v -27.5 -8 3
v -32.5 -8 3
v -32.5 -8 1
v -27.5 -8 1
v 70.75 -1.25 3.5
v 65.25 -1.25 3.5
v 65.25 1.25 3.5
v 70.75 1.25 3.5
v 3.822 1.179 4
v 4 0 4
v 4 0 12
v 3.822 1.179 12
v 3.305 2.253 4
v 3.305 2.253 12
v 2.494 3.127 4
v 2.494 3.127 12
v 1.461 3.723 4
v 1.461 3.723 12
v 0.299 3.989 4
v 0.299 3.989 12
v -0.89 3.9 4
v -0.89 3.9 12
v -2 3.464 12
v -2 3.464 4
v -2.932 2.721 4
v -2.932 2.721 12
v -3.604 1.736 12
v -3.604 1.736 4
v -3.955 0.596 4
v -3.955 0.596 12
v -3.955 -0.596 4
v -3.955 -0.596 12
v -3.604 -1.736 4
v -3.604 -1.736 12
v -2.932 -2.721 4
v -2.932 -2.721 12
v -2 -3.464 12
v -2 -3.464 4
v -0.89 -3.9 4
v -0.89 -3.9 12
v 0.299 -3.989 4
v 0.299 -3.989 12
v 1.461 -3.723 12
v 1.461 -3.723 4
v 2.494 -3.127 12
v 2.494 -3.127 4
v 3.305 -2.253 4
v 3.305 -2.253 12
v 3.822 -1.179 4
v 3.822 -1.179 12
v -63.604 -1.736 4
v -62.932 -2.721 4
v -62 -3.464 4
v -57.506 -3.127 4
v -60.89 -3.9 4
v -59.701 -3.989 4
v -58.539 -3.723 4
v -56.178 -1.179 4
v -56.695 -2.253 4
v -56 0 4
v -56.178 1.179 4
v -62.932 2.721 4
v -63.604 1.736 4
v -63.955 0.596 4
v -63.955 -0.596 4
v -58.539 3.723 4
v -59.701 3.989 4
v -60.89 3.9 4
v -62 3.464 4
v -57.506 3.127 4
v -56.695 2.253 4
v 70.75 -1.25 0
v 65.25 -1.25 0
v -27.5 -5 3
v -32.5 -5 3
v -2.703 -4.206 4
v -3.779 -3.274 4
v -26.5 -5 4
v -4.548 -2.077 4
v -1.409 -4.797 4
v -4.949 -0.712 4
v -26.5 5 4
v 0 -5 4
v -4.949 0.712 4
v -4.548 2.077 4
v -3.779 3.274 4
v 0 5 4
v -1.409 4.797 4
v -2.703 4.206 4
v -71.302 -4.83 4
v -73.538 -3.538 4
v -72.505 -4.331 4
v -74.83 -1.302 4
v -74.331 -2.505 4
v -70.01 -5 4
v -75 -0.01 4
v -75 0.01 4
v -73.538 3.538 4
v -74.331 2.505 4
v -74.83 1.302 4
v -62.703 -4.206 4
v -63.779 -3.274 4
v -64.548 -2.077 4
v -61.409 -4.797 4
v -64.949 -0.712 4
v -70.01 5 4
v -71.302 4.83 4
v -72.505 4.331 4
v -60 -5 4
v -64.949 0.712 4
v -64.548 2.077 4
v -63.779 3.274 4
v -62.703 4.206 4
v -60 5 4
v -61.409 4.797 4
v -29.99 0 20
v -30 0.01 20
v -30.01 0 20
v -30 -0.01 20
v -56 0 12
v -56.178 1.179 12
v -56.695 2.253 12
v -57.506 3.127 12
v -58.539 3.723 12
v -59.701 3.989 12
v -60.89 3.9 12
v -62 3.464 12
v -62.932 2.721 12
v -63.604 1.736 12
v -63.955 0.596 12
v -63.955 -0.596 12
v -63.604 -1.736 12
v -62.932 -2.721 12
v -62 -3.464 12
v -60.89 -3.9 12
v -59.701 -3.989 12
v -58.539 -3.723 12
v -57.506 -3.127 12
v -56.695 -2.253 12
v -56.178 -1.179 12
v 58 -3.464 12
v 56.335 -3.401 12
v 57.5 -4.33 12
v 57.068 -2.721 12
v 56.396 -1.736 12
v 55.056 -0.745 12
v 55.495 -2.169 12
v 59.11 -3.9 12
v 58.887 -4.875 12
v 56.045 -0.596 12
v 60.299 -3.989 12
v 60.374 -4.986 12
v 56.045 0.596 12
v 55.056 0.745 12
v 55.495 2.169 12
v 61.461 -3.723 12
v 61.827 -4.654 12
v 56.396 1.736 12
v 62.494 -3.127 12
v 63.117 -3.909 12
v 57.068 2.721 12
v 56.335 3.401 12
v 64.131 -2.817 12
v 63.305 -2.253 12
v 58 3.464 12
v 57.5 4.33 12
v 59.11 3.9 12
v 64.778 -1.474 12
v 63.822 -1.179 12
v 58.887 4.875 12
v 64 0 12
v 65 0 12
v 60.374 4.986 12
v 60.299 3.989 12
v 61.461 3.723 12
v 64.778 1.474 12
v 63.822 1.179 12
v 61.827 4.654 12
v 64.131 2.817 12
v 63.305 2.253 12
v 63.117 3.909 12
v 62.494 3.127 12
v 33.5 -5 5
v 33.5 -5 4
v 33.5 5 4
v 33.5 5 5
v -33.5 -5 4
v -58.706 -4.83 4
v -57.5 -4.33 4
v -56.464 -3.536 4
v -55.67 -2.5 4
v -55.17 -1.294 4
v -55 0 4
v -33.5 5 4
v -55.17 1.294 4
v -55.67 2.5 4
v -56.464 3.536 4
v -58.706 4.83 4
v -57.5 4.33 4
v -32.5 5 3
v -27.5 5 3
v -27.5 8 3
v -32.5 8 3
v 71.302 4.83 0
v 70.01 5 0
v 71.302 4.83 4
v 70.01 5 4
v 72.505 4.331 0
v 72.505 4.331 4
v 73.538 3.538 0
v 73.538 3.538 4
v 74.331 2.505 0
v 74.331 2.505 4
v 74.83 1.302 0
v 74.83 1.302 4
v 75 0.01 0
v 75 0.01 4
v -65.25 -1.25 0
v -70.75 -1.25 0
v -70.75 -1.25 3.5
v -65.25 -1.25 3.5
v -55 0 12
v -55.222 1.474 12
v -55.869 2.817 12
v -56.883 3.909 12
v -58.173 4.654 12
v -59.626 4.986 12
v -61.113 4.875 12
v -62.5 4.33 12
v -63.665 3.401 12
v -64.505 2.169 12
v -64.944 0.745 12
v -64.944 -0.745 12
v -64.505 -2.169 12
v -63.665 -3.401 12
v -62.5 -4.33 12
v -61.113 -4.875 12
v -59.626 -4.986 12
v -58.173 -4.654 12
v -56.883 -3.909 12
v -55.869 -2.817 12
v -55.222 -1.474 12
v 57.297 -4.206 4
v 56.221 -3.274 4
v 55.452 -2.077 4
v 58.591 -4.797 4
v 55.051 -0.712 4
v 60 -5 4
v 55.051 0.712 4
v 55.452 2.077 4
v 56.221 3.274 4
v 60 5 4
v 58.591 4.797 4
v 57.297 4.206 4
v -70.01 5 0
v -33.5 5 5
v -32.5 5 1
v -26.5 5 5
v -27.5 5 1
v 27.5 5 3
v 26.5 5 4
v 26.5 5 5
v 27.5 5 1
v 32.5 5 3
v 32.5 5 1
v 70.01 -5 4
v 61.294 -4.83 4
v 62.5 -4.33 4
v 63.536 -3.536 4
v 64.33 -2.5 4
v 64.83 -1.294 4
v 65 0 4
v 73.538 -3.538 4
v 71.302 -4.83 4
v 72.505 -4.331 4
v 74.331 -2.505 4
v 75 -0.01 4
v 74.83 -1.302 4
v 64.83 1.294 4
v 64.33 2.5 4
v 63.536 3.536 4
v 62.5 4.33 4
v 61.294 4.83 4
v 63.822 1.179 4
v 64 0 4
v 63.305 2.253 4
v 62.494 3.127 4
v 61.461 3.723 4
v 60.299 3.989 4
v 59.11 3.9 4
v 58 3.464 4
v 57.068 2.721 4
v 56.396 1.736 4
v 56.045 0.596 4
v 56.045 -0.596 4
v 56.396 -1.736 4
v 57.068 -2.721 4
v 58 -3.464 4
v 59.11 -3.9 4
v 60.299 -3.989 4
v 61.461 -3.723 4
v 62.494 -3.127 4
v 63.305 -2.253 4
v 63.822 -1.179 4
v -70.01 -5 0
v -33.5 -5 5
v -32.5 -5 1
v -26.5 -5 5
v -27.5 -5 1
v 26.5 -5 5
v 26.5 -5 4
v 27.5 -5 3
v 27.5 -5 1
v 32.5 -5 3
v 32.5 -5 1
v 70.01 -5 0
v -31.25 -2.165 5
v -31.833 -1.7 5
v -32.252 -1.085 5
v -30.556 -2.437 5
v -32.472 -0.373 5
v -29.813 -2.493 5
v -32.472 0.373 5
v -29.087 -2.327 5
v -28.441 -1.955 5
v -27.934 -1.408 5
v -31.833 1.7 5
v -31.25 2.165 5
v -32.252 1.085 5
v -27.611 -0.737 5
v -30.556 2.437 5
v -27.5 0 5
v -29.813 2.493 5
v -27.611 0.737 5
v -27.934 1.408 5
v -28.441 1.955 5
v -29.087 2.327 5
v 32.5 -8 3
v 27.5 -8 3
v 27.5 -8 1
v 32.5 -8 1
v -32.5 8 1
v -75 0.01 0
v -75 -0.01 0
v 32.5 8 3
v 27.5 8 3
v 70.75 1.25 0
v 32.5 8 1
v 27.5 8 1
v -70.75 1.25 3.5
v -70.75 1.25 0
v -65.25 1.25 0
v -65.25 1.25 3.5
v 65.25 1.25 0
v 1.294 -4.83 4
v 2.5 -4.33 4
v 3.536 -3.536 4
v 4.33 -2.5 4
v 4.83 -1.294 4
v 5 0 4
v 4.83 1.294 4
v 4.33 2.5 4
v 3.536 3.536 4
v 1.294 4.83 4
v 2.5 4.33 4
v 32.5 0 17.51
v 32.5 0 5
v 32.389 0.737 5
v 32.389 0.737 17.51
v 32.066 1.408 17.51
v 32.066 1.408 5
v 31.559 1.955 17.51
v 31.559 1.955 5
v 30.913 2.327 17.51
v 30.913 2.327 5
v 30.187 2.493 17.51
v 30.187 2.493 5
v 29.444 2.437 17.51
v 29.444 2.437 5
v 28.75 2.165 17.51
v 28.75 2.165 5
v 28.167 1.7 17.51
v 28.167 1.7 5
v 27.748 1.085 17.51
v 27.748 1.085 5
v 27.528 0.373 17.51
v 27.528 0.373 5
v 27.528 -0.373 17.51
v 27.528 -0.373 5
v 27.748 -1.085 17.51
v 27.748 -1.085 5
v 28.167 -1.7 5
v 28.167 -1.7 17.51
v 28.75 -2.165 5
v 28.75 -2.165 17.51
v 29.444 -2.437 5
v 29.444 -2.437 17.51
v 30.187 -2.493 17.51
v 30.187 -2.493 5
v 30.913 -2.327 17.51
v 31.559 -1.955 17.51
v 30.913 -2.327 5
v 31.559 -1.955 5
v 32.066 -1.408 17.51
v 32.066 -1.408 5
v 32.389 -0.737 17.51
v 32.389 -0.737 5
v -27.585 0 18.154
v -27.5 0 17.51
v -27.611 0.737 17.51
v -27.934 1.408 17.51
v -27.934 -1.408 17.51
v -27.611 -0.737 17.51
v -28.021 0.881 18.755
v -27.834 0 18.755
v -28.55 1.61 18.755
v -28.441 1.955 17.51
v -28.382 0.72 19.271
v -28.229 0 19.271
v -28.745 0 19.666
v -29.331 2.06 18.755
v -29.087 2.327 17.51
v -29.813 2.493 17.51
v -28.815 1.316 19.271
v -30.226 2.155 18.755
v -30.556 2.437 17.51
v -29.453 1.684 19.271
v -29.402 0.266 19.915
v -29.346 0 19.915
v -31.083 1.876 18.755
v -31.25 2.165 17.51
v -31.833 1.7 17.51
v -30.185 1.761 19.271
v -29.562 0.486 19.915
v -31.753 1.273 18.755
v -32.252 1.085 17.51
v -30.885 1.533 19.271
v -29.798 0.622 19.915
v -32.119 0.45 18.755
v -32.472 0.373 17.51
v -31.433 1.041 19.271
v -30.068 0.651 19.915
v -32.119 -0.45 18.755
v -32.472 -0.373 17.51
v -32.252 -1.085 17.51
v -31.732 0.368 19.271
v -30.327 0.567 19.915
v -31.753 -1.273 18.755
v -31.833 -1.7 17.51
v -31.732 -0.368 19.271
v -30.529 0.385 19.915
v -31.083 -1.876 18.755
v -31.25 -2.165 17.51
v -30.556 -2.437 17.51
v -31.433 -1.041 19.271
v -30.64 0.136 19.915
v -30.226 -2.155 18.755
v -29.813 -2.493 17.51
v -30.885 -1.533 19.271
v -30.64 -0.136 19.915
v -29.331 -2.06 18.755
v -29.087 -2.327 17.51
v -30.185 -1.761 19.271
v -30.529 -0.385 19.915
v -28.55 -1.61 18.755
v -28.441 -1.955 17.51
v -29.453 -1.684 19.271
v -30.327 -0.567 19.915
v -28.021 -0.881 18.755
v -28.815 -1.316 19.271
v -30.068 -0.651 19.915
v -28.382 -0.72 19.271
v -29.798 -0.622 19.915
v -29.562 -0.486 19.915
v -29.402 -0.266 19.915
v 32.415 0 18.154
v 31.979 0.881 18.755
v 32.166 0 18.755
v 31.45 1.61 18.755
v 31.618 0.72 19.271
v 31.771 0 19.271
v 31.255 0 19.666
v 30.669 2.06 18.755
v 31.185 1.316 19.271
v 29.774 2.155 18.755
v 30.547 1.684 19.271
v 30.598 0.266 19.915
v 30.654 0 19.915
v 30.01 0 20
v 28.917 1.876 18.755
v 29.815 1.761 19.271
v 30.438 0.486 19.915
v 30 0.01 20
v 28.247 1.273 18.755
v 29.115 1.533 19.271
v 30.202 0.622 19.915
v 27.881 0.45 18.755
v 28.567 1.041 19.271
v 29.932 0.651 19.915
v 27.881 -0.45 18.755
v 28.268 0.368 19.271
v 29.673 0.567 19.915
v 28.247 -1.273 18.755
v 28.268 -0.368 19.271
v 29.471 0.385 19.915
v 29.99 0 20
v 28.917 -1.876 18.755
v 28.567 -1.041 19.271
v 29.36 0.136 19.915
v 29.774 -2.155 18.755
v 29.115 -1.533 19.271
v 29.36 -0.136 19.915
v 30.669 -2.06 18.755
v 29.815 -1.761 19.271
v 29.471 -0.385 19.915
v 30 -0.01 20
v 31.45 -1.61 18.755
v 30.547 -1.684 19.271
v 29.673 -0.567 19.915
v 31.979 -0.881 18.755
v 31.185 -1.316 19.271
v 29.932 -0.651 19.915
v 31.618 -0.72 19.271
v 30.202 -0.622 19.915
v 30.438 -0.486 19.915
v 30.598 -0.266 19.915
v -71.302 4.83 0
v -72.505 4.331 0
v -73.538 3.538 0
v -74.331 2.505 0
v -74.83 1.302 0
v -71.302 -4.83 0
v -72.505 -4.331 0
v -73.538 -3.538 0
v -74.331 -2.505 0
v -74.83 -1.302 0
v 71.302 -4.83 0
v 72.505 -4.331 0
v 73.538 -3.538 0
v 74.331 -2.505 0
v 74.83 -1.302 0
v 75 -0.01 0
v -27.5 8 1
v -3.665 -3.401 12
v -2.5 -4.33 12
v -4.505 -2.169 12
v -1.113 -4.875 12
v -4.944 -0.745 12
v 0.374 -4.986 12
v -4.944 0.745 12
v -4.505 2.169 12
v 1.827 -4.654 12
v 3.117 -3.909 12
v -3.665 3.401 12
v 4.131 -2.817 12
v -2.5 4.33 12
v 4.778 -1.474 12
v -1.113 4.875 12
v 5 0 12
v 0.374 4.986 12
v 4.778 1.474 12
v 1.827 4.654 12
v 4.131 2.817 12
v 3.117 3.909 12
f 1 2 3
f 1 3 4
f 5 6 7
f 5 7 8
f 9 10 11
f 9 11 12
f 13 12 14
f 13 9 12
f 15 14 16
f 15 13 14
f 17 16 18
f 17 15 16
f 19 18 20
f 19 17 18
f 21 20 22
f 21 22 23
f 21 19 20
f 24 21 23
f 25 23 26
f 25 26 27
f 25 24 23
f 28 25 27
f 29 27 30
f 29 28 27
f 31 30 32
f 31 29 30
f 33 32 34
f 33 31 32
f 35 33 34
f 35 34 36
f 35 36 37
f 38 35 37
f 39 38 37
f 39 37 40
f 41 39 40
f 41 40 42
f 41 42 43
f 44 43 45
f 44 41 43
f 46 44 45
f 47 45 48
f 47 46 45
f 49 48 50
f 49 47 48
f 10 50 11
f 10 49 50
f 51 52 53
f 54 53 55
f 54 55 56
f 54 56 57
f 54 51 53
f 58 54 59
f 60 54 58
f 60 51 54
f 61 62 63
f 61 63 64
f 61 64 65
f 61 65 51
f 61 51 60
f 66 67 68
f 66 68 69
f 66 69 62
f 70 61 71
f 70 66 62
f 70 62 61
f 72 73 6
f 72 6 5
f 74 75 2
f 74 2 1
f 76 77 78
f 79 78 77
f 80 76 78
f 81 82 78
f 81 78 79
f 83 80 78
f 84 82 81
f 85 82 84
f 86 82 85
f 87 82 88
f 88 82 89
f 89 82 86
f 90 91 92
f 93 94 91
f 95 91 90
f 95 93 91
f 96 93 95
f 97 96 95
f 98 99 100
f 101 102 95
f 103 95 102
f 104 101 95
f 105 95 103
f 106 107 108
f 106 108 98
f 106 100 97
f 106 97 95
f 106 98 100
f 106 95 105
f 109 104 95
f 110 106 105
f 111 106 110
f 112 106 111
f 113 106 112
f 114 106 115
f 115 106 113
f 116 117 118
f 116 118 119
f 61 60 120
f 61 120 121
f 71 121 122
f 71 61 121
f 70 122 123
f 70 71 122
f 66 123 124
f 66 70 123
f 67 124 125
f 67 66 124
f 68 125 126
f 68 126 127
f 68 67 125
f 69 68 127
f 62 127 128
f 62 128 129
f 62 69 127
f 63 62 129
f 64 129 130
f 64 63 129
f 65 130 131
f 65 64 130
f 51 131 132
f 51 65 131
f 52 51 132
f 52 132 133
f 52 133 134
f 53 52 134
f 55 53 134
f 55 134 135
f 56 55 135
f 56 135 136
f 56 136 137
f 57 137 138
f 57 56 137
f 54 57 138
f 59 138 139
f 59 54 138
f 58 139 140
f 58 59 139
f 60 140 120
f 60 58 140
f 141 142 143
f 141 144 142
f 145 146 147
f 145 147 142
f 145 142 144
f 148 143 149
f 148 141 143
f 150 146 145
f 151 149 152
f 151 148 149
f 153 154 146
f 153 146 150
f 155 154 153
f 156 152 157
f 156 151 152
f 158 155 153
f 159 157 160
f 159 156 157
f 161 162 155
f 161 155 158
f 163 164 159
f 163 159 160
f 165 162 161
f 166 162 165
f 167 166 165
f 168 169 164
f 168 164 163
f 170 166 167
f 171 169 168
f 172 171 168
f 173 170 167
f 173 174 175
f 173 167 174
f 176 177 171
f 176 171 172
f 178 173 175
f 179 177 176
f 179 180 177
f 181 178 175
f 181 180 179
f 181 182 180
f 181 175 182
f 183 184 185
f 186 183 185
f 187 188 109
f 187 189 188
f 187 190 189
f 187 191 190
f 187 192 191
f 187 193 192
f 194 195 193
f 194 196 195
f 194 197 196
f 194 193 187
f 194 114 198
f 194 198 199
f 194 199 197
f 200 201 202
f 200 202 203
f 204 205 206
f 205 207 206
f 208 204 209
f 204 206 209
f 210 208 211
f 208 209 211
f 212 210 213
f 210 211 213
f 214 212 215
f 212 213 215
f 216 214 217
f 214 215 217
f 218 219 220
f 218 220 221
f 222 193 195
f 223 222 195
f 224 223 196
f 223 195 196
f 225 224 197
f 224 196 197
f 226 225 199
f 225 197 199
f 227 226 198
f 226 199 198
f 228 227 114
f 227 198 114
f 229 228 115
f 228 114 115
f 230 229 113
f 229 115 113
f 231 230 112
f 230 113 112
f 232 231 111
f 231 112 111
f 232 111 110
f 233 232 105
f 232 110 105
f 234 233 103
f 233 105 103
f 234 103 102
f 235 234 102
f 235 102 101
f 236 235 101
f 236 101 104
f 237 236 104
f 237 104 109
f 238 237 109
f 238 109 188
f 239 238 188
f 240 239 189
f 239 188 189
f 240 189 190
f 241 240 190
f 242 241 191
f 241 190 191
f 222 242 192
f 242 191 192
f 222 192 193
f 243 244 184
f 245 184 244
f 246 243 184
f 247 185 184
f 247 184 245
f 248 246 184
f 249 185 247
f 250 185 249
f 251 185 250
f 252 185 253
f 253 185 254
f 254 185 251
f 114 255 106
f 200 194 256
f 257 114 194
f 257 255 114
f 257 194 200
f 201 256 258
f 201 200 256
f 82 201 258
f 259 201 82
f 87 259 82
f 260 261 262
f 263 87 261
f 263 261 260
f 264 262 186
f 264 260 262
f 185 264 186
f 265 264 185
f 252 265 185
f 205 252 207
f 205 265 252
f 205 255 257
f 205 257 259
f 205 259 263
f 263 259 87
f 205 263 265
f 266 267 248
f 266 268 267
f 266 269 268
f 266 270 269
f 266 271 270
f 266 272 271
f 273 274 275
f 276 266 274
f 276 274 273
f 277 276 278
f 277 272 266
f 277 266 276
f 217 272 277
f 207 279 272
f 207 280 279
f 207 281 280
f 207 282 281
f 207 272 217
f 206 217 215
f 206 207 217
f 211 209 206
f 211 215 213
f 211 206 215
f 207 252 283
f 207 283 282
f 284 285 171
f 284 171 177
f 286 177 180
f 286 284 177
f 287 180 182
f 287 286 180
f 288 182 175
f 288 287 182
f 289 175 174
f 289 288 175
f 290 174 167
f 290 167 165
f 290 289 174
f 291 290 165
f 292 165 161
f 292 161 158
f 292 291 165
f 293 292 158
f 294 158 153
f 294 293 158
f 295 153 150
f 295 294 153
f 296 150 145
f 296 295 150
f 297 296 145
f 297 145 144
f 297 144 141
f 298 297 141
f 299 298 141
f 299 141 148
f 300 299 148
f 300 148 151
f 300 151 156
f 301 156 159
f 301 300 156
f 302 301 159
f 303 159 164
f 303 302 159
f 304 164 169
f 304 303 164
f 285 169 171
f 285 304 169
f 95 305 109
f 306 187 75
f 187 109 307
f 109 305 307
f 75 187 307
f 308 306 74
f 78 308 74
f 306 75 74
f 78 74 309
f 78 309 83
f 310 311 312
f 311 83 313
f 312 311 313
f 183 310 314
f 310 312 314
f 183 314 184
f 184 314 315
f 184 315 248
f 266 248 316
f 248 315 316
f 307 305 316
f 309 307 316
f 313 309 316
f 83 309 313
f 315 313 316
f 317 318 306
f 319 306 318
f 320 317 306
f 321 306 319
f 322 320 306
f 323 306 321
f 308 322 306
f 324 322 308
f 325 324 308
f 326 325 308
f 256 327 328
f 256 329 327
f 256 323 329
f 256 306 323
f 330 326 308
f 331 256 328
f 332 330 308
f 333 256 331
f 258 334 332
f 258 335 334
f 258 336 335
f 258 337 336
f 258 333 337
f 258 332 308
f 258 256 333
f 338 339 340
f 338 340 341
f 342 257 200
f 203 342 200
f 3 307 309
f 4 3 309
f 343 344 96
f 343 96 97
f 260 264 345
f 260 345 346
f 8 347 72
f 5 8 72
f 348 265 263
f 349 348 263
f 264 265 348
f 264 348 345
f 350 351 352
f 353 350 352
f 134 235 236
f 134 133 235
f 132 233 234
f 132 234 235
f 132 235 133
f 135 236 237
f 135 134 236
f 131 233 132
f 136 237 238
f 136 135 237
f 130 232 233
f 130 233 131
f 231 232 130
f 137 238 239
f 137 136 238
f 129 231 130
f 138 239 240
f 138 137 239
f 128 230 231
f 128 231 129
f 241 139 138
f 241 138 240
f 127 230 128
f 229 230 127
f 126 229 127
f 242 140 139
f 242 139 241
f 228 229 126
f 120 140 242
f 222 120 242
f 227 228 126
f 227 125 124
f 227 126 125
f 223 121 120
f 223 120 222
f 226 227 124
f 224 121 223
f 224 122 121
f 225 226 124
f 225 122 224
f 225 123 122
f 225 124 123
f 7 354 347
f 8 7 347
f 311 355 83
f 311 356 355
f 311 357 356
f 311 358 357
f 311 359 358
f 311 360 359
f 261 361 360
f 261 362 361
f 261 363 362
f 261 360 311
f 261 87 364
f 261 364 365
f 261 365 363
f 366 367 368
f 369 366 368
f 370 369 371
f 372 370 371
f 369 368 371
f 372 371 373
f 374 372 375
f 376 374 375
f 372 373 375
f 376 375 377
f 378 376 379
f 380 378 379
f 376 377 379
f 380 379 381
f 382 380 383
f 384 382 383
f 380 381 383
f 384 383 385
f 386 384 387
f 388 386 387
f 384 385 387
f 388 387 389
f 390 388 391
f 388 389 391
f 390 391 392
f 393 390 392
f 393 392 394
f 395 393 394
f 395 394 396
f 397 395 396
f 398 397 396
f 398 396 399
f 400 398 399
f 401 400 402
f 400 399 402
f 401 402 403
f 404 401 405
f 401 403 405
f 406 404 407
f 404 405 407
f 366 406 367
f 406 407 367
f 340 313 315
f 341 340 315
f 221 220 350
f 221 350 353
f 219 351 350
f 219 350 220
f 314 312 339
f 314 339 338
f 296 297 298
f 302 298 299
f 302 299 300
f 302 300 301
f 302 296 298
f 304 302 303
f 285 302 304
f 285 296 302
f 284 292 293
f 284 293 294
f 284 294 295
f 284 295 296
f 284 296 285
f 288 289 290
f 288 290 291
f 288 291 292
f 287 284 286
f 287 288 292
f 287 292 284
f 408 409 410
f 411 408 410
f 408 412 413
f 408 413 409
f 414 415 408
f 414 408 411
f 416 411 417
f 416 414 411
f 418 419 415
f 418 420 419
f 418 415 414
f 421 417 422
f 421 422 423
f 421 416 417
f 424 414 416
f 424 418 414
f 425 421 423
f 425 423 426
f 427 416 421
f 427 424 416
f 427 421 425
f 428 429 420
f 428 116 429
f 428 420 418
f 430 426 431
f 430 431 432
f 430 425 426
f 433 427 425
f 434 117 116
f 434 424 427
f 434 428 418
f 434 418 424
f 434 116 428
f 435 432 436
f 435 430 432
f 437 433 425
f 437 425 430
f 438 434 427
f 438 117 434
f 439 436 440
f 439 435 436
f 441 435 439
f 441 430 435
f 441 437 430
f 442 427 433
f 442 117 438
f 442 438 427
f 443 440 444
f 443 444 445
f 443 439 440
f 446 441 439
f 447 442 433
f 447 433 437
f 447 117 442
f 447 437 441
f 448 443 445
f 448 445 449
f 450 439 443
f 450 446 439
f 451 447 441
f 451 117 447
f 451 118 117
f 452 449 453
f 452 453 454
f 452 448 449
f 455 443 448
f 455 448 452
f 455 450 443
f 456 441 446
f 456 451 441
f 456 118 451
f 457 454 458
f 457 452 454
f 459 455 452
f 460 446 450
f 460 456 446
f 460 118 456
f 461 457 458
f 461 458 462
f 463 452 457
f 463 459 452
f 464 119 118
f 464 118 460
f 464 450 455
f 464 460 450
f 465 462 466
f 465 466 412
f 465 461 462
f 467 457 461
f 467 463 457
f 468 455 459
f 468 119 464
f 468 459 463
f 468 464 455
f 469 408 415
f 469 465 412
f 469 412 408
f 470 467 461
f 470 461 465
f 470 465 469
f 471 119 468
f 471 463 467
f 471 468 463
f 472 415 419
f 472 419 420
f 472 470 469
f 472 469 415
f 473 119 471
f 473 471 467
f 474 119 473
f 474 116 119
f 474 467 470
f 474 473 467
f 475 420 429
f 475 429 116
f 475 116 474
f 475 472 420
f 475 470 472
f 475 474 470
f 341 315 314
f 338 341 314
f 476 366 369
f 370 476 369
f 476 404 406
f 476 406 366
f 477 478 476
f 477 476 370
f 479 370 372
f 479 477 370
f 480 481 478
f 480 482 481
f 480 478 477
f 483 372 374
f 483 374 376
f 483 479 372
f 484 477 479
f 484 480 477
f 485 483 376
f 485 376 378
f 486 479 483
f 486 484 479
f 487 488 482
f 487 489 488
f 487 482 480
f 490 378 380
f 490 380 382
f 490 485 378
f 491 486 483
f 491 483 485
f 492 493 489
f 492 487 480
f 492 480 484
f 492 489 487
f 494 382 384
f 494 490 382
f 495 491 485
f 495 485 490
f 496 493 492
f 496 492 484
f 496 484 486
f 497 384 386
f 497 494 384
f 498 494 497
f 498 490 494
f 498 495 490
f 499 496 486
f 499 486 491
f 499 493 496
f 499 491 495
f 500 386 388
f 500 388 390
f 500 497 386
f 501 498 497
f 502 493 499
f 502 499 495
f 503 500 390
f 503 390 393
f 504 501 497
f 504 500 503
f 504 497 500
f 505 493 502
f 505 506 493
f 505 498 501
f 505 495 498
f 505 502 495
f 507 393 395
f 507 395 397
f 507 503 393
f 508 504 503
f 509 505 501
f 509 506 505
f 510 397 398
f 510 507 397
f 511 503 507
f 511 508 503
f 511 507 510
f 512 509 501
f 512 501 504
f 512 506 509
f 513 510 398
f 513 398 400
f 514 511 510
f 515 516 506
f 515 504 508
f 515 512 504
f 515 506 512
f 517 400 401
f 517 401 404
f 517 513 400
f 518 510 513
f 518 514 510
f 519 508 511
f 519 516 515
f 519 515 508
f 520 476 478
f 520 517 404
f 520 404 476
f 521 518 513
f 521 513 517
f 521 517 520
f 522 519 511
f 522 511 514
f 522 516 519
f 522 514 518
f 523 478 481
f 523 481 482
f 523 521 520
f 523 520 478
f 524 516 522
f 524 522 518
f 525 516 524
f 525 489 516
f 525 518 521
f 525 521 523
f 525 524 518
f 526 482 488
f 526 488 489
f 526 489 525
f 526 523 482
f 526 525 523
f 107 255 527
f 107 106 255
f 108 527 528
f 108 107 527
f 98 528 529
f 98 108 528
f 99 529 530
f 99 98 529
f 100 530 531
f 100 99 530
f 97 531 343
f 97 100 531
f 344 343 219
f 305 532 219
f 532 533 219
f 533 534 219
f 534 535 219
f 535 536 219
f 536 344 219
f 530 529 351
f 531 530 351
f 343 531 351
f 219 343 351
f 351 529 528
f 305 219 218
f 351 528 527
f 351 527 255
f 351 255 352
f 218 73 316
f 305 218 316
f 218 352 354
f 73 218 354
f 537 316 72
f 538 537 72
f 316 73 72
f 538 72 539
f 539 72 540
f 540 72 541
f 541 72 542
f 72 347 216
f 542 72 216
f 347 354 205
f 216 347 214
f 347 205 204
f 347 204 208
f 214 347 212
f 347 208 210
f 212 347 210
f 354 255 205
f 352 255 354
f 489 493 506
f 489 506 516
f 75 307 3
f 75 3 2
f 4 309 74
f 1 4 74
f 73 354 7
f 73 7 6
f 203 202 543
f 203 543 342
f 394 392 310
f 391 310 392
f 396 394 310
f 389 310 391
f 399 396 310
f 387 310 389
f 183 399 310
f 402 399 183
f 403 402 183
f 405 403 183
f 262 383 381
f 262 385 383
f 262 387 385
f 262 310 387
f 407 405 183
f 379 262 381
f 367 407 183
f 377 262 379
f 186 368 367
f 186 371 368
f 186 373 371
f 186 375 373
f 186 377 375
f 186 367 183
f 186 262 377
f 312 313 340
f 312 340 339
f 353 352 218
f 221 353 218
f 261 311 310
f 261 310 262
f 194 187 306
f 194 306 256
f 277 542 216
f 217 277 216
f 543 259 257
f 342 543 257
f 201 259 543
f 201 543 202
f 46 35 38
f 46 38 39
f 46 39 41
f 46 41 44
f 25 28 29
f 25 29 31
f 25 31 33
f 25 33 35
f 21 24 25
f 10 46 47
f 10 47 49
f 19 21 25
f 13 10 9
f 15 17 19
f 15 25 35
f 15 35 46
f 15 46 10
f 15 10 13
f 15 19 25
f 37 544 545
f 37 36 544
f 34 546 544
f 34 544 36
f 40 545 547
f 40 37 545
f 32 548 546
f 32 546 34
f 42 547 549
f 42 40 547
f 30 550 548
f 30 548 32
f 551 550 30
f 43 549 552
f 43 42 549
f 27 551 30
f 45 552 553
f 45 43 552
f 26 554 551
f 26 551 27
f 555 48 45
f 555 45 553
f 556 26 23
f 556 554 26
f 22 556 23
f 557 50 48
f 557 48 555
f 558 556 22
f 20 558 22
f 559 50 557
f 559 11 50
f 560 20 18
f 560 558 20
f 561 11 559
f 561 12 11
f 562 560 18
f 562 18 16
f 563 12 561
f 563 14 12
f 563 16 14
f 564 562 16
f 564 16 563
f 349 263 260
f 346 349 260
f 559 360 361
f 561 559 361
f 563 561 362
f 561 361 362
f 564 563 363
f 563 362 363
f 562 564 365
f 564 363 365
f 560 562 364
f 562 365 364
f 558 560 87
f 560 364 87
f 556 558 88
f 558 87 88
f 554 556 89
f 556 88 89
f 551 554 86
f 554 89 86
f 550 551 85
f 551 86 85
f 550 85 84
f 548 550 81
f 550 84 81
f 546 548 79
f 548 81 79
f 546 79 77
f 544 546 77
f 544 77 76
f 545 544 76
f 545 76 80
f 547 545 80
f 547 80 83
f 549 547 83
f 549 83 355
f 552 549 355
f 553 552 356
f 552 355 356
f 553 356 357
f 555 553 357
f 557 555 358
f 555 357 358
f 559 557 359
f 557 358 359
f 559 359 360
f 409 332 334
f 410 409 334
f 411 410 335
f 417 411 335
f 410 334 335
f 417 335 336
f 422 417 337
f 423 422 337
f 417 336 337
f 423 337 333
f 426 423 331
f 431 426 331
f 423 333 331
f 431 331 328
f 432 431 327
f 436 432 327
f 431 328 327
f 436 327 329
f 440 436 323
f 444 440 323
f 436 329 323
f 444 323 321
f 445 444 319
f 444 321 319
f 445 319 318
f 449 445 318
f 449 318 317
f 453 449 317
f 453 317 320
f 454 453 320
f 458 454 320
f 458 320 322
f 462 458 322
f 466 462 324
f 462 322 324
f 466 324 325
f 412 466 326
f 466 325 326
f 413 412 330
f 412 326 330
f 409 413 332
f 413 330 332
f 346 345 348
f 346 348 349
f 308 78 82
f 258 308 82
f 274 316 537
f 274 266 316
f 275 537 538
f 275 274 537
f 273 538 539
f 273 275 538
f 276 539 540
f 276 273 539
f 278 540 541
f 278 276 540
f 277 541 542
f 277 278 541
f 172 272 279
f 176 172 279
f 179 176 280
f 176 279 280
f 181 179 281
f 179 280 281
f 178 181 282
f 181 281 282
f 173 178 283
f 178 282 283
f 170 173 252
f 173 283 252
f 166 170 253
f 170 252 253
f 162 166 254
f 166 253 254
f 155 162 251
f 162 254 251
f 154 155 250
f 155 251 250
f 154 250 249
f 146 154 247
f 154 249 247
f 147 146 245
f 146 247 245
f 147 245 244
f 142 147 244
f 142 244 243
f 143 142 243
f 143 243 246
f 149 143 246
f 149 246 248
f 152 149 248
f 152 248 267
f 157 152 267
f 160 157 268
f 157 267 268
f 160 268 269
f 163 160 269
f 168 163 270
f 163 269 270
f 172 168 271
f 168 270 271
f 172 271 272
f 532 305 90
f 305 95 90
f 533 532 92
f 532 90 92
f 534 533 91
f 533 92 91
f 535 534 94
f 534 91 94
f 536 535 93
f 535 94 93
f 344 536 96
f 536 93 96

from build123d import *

# Parameters (mm, degrees)
SKETCH_W      = 150
SKETCH_H      = 10
PAD_DEPTH     = 4
SKETCH001_R   = 5
SKETCH001_R_2 = 4
PAD001_DEPTH  = 8
FILLET_R      = 4.99
SKETCH002_W   = 5.5
SKETCH002_H   = 2.5
POCKET_DEPTH  = 3.5
SKETCH004_W   = 5
SKETCH004_H   = 2
PAD002_DEPTH  = 3
SKETCH005_W   = 5
SKETCH005_H   = 2
PAD003_DEPTH  = 3
SKETCH006_W   = 7
SKETCH006_H   = 10
PAD004_DEPTH  = 1
SKETCH008_R   = 2.5
PAD005_DEPTH  = 15
FILLET001_R   = 2.49


with BuildPart() as part:
    # Sketch → Pad (new body)
    with BuildSketch(Plane.XY):
        Rectangle(SKETCH_W, SKETCH_H)
    extrude(amount=PAD_DEPTH)

    # Sketch001 (on Face6 of Pad) → Pad001 (join)
    with BuildSketch(Plane.XY.offset(4)):
        Circle(SKETCH001_R)
        Circle(SKETCH001_R_2, mode=Mode.SUBTRACT)
        with Locations((60, 0)):
            Circle(SKETCH001_R)
        with Locations((60, 0)):
            Circle(SKETCH001_R_2, mode=Mode.SUBTRACT)
        with Locations((-60, 0)):
            Circle(SKETCH001_R)
        with Locations((-60, 0)):
            Circle(SKETCH001_R_2, mode=Mode.SUBTRACT)
    extrude(amount=PAD001_DEPTH)

    # Fillet
    fillet_edges = [part.edges().sort_by_distance(p)[0] for p in [
        (-75, 5, 2),
        (-75, -5, 2),
        (75, 5, 2),
        (75, -5, 2),
    ]]
    fillet(fillet_edges, radius=FILLET_R)

    # Sketch002 (on Face2 of Fillet) → Pocket (cut)
    with BuildSketch(Plane(origin=(0, 0, 0), x_dir=(1, 0, 0), z_dir=(0, 0, -1))):
        with Locations((-68, 0)):
            Rectangle(SKETCH002_W, SKETCH002_H)
        with Locations((68, 0)):
            Rectangle(SKETCH002_W, SKETCH002_H)
    extrude(amount=-POCKET_DEPTH, mode=Mode.SUBTRACT)

    # Sketch004 (on Face6 of Pocket) → Pad002 (join)
    with BuildSketch(Plane(origin=(0, 5, 0), x_dir=(-1, 0, 0), z_dir=(0, 1, 0))):
        with Locations((-30, 2)):
            Rectangle(SKETCH004_W, SKETCH004_H)
        with Locations((30, 2)):
            Rectangle(SKETCH004_W, SKETCH004_H)
    extrude(amount=PAD002_DEPTH)

    # Sketch005 (on Face7 of Pocket) → Pad003 (join)
    with BuildSketch(Plane.XZ.offset(5)):
        with Locations((-30, 2)):
            Rectangle(SKETCH005_W, SKETCH005_H)
        with Locations((30, 2)):
            Rectangle(SKETCH005_W, SKETCH005_H)
    extrude(amount=PAD003_DEPTH)

    # Sketch006 (on Face22 of Pad003) → Pad004 (join)
    with BuildSketch(Plane.XY.offset(4)):
        with Locations((-30, 0)):
            Rectangle(SKETCH006_W, SKETCH006_H)
        with Locations((30, 0)):
            Rectangle(SKETCH006_W, SKETCH006_H)
    extrude(amount=PAD004_DEPTH)

    # Sketch008 (on Face55 of Pad004) → Pad005 (join)
    with BuildSketch(Plane.XY.offset(5)):
        with Locations((-30, 0)):
            Circle(SKETCH008_R)
        with Locations((30, 0)):
            Circle(SKETCH008_R)
    extrude(amount=PAD005_DEPTH)

    # Fillet001
    fillet001_edges = [part.edges().sort_by_distance(p)[0] for p in [
        (27.5, 0, 20),
        (-32.5, 0, 20),
    ]]
    fillet(fillet001_edges, radius=FILLET001_R)


solid = part.part
